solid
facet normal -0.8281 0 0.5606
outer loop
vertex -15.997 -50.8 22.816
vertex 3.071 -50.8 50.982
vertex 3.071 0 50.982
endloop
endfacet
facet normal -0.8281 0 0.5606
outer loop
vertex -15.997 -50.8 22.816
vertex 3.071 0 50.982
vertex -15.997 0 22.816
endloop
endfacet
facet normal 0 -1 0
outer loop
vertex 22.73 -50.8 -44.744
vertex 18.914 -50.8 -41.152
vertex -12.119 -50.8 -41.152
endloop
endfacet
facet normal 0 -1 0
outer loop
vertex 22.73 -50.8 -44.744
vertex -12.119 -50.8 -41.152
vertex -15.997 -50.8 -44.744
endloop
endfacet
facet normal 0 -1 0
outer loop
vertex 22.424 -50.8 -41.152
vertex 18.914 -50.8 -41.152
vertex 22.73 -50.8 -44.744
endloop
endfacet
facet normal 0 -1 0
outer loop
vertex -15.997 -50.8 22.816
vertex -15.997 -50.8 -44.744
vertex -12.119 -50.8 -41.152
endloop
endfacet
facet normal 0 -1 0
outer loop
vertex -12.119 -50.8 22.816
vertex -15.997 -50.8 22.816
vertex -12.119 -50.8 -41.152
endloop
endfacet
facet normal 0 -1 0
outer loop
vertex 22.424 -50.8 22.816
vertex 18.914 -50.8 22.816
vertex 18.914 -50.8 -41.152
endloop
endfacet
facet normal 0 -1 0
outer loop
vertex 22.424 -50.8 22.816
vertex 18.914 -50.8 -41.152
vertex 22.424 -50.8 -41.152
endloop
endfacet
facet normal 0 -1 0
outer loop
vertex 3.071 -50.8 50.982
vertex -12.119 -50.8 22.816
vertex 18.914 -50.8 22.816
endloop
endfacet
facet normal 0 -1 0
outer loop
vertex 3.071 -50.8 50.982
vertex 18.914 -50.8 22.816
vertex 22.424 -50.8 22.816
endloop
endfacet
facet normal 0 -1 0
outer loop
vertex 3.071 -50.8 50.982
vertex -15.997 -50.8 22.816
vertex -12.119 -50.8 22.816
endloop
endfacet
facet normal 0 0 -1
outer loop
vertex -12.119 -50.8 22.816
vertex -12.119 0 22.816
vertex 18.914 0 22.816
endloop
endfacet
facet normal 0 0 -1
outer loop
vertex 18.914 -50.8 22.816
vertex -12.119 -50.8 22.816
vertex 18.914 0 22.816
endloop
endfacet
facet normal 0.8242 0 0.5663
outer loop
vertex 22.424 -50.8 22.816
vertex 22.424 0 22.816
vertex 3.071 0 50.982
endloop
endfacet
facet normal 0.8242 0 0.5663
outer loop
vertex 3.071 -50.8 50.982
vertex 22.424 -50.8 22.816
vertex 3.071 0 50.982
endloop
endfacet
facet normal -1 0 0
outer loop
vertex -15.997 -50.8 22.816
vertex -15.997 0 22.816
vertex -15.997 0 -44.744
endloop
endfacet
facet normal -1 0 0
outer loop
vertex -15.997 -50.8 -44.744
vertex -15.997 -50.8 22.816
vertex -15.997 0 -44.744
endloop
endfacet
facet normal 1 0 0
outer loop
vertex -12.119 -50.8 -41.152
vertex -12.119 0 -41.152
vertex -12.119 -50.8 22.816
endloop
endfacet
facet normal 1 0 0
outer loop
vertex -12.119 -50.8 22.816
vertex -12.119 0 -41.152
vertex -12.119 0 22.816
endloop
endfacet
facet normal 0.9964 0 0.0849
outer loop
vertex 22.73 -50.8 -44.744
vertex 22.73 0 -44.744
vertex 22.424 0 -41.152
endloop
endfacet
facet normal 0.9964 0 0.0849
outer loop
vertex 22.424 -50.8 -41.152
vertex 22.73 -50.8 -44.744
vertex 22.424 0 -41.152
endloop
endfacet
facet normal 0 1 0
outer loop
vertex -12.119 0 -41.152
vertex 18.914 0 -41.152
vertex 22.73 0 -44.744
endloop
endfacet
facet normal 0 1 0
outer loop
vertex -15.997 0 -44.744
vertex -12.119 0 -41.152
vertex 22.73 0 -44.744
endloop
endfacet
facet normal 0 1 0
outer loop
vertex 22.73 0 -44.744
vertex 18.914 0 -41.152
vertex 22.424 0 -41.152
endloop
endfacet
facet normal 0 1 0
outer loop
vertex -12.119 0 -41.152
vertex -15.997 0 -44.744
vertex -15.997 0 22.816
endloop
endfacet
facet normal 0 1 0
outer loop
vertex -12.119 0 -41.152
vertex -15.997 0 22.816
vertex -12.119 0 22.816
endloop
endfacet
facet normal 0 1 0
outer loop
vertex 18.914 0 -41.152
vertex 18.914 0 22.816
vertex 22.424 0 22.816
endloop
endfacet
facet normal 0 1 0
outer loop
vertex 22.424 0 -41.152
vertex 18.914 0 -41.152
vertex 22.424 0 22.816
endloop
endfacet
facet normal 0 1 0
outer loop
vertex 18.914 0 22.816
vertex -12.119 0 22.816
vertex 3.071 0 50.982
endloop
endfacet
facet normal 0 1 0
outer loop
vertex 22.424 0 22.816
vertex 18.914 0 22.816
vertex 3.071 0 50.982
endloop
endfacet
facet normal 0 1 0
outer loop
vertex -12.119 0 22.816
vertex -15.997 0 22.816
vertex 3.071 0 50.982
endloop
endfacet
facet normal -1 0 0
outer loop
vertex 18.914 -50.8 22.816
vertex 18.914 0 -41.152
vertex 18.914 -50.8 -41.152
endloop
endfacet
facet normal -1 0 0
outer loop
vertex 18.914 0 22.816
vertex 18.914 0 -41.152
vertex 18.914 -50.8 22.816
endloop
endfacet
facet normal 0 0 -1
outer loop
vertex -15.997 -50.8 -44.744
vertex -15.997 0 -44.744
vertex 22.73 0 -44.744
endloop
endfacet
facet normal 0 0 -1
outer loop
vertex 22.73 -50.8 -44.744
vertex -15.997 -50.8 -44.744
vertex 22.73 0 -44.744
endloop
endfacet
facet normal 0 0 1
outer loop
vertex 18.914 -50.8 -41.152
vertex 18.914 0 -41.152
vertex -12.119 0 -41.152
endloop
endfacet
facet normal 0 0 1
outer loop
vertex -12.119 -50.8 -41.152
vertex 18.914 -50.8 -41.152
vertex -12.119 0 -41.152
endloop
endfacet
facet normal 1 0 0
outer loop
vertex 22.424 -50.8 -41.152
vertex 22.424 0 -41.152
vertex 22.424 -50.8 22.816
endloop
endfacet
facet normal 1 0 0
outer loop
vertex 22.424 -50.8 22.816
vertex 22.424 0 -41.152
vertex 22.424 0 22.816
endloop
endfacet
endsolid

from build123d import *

# Parameters (mm, degrees)
F0_W     = 3.8772569518
F0_H     = 63.9679611865
F0_W_2   = 3.5099290236
F1_DEPTH = 50.8


with BuildPart() as f1:
    # F0 (on Front) → F1 (new body)
    with BuildSketch(Plane.XZ):
        with Locations((-14.058026042, -9.1675467221)):
            Rectangle(F0_W, F0_H)
        Polygon((3.0713511857, 50.9821392888), (-15.9966545179, 22.8164338711), (-12.1193975661, 22.8164338711), (18.9136061812, 22.8164338711), (22.4235352048, 22.8164338711), align=None)
        Polygon((-12.1193975661, -41.1515273154), (-15.9966545179, -41.1515273154), (-15.9966545179, -44.7443164885), (22.7297032942, -44.7443164885), (22.4235352048, -41.1515273154), (18.9136061812, -41.1515273154), align=None)
        with Locations((20.668570693, -9.1675467221)):
            Rectangle(F0_W_2, F0_H)
    extrude(amount=F1_DEPTH)


solid = f1.part
